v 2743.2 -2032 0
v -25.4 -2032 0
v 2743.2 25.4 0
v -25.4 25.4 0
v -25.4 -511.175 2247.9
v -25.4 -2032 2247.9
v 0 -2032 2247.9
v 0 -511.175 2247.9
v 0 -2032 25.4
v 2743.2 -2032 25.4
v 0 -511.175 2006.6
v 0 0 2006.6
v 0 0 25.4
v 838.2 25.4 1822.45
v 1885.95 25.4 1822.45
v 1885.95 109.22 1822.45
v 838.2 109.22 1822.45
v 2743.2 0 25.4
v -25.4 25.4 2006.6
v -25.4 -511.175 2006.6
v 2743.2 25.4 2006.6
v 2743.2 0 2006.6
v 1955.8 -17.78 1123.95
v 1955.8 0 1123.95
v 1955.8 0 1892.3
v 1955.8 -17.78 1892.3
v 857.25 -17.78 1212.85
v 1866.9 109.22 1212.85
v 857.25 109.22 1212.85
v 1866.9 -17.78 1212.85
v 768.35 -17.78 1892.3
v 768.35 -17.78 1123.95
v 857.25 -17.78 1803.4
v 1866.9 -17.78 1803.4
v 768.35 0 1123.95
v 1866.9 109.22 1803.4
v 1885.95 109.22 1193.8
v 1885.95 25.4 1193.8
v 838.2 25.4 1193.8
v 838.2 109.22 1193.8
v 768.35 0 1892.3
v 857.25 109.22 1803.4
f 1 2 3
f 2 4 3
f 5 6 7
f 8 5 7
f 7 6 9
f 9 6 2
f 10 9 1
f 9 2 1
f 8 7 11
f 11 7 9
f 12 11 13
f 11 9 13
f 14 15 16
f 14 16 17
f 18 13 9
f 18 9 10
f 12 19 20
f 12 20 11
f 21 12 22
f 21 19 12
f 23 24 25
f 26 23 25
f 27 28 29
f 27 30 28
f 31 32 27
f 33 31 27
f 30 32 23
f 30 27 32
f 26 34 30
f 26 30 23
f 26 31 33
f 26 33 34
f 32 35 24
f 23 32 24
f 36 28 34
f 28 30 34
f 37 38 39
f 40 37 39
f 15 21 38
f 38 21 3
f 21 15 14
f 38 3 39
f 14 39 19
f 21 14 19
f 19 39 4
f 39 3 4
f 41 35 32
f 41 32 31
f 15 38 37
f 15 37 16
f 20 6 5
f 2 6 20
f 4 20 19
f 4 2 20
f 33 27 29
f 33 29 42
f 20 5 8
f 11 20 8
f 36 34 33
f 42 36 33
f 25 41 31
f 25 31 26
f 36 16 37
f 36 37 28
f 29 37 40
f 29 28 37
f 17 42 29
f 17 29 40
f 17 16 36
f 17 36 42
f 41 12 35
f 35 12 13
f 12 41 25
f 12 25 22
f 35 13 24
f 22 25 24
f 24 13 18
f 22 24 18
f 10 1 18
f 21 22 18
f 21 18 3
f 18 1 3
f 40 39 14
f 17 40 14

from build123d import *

# Parameters (mm, degrees)
F0_W      = 2743.2
F0_H      = 2032
F1_DEPTH  = 25.4
F2_W      = 25.4
F2_H      = 2032
F3_DEPTH  = 2006.6
F4_W      = 1187.45
F4_H      = 768.35
F4_W_2    = 1009.65
F4_H_2    = 590.55
F5_DEPTH  = 17.78
F6_DEPTH  = 25.4
F7_W      = 1047.75
F7_H      = 628.65
F7_W_2    = 1009.65
F7_H_2    = 590.55
F8_DEPTH  = 83.82
F9_W      = 25.4
F9_H      = 1520.825
F10_DEPTH = 241.3


with BuildPart() as f1:
    # F0 (on Top) → F1 (new body)
    with BuildSketch(Plane.XY):
        with Locations((1371.6, -1016)):
            Rectangle(F0_W, F0_H)
    extrude(amount=F1_DEPTH)

    # F2 (on Top) → F3 (join)
    with BuildSketch(Plane.XY):
        with Locations((-12.7, -1016)):
            Rectangle(F2_W, F2_H)
        Polygon((-25.4, 0), (0, 0), (2743.2, 0), (2743.2, 25.4), (-25.4, 25.4), align=None)
    extrude(amount=F3_DEPTH)

    # F4 (on face) → F5 (join)
    with BuildSketch(Plane.XZ):
        with Locations((1362.075, 1508.125)):
            Rectangle(F4_W, F4_H)
        with Locations((1362.075, 1508.125)):
            Rectangle(F4_W_2, F4_H_2, mode=Mode.SUBTRACT)
    extrude(amount=F5_DEPTH)

    # F6 (cut): a face of the model
    f6_faces = [f1.faces().sort_by_distance(p)[0] for p in [
        (1362.075, 0, 1508.125),
    ]]
    extrude(f6_faces, amount=-F6_DEPTH, mode=Mode.SUBTRACT)

    # F7 (on face) → F8 (join)
    with BuildSketch(Plane(origin=(0, 25.4, 0), x_dir=(-1, 0, 0), z_dir=(0, 1, 0))):
        with Locations((-1362.075, 1508.125)):
            Rectangle(F7_W, F7_H)
        with Locations((-1362.075, 1508.125)):
            Rectangle(F7_W_2, F7_H_2, mode=Mode.SUBTRACT)
    extrude(amount=F8_DEPTH)

    # F9 (on face) → F10 (join)
    with BuildSketch(Plane.XY.offset(2006.6)):
        with Locations((-12.7, -1271.5875)):
            Rectangle(F9_W, F9_H)
    extrude(amount=F10_DEPTH)


solid = f1.part
